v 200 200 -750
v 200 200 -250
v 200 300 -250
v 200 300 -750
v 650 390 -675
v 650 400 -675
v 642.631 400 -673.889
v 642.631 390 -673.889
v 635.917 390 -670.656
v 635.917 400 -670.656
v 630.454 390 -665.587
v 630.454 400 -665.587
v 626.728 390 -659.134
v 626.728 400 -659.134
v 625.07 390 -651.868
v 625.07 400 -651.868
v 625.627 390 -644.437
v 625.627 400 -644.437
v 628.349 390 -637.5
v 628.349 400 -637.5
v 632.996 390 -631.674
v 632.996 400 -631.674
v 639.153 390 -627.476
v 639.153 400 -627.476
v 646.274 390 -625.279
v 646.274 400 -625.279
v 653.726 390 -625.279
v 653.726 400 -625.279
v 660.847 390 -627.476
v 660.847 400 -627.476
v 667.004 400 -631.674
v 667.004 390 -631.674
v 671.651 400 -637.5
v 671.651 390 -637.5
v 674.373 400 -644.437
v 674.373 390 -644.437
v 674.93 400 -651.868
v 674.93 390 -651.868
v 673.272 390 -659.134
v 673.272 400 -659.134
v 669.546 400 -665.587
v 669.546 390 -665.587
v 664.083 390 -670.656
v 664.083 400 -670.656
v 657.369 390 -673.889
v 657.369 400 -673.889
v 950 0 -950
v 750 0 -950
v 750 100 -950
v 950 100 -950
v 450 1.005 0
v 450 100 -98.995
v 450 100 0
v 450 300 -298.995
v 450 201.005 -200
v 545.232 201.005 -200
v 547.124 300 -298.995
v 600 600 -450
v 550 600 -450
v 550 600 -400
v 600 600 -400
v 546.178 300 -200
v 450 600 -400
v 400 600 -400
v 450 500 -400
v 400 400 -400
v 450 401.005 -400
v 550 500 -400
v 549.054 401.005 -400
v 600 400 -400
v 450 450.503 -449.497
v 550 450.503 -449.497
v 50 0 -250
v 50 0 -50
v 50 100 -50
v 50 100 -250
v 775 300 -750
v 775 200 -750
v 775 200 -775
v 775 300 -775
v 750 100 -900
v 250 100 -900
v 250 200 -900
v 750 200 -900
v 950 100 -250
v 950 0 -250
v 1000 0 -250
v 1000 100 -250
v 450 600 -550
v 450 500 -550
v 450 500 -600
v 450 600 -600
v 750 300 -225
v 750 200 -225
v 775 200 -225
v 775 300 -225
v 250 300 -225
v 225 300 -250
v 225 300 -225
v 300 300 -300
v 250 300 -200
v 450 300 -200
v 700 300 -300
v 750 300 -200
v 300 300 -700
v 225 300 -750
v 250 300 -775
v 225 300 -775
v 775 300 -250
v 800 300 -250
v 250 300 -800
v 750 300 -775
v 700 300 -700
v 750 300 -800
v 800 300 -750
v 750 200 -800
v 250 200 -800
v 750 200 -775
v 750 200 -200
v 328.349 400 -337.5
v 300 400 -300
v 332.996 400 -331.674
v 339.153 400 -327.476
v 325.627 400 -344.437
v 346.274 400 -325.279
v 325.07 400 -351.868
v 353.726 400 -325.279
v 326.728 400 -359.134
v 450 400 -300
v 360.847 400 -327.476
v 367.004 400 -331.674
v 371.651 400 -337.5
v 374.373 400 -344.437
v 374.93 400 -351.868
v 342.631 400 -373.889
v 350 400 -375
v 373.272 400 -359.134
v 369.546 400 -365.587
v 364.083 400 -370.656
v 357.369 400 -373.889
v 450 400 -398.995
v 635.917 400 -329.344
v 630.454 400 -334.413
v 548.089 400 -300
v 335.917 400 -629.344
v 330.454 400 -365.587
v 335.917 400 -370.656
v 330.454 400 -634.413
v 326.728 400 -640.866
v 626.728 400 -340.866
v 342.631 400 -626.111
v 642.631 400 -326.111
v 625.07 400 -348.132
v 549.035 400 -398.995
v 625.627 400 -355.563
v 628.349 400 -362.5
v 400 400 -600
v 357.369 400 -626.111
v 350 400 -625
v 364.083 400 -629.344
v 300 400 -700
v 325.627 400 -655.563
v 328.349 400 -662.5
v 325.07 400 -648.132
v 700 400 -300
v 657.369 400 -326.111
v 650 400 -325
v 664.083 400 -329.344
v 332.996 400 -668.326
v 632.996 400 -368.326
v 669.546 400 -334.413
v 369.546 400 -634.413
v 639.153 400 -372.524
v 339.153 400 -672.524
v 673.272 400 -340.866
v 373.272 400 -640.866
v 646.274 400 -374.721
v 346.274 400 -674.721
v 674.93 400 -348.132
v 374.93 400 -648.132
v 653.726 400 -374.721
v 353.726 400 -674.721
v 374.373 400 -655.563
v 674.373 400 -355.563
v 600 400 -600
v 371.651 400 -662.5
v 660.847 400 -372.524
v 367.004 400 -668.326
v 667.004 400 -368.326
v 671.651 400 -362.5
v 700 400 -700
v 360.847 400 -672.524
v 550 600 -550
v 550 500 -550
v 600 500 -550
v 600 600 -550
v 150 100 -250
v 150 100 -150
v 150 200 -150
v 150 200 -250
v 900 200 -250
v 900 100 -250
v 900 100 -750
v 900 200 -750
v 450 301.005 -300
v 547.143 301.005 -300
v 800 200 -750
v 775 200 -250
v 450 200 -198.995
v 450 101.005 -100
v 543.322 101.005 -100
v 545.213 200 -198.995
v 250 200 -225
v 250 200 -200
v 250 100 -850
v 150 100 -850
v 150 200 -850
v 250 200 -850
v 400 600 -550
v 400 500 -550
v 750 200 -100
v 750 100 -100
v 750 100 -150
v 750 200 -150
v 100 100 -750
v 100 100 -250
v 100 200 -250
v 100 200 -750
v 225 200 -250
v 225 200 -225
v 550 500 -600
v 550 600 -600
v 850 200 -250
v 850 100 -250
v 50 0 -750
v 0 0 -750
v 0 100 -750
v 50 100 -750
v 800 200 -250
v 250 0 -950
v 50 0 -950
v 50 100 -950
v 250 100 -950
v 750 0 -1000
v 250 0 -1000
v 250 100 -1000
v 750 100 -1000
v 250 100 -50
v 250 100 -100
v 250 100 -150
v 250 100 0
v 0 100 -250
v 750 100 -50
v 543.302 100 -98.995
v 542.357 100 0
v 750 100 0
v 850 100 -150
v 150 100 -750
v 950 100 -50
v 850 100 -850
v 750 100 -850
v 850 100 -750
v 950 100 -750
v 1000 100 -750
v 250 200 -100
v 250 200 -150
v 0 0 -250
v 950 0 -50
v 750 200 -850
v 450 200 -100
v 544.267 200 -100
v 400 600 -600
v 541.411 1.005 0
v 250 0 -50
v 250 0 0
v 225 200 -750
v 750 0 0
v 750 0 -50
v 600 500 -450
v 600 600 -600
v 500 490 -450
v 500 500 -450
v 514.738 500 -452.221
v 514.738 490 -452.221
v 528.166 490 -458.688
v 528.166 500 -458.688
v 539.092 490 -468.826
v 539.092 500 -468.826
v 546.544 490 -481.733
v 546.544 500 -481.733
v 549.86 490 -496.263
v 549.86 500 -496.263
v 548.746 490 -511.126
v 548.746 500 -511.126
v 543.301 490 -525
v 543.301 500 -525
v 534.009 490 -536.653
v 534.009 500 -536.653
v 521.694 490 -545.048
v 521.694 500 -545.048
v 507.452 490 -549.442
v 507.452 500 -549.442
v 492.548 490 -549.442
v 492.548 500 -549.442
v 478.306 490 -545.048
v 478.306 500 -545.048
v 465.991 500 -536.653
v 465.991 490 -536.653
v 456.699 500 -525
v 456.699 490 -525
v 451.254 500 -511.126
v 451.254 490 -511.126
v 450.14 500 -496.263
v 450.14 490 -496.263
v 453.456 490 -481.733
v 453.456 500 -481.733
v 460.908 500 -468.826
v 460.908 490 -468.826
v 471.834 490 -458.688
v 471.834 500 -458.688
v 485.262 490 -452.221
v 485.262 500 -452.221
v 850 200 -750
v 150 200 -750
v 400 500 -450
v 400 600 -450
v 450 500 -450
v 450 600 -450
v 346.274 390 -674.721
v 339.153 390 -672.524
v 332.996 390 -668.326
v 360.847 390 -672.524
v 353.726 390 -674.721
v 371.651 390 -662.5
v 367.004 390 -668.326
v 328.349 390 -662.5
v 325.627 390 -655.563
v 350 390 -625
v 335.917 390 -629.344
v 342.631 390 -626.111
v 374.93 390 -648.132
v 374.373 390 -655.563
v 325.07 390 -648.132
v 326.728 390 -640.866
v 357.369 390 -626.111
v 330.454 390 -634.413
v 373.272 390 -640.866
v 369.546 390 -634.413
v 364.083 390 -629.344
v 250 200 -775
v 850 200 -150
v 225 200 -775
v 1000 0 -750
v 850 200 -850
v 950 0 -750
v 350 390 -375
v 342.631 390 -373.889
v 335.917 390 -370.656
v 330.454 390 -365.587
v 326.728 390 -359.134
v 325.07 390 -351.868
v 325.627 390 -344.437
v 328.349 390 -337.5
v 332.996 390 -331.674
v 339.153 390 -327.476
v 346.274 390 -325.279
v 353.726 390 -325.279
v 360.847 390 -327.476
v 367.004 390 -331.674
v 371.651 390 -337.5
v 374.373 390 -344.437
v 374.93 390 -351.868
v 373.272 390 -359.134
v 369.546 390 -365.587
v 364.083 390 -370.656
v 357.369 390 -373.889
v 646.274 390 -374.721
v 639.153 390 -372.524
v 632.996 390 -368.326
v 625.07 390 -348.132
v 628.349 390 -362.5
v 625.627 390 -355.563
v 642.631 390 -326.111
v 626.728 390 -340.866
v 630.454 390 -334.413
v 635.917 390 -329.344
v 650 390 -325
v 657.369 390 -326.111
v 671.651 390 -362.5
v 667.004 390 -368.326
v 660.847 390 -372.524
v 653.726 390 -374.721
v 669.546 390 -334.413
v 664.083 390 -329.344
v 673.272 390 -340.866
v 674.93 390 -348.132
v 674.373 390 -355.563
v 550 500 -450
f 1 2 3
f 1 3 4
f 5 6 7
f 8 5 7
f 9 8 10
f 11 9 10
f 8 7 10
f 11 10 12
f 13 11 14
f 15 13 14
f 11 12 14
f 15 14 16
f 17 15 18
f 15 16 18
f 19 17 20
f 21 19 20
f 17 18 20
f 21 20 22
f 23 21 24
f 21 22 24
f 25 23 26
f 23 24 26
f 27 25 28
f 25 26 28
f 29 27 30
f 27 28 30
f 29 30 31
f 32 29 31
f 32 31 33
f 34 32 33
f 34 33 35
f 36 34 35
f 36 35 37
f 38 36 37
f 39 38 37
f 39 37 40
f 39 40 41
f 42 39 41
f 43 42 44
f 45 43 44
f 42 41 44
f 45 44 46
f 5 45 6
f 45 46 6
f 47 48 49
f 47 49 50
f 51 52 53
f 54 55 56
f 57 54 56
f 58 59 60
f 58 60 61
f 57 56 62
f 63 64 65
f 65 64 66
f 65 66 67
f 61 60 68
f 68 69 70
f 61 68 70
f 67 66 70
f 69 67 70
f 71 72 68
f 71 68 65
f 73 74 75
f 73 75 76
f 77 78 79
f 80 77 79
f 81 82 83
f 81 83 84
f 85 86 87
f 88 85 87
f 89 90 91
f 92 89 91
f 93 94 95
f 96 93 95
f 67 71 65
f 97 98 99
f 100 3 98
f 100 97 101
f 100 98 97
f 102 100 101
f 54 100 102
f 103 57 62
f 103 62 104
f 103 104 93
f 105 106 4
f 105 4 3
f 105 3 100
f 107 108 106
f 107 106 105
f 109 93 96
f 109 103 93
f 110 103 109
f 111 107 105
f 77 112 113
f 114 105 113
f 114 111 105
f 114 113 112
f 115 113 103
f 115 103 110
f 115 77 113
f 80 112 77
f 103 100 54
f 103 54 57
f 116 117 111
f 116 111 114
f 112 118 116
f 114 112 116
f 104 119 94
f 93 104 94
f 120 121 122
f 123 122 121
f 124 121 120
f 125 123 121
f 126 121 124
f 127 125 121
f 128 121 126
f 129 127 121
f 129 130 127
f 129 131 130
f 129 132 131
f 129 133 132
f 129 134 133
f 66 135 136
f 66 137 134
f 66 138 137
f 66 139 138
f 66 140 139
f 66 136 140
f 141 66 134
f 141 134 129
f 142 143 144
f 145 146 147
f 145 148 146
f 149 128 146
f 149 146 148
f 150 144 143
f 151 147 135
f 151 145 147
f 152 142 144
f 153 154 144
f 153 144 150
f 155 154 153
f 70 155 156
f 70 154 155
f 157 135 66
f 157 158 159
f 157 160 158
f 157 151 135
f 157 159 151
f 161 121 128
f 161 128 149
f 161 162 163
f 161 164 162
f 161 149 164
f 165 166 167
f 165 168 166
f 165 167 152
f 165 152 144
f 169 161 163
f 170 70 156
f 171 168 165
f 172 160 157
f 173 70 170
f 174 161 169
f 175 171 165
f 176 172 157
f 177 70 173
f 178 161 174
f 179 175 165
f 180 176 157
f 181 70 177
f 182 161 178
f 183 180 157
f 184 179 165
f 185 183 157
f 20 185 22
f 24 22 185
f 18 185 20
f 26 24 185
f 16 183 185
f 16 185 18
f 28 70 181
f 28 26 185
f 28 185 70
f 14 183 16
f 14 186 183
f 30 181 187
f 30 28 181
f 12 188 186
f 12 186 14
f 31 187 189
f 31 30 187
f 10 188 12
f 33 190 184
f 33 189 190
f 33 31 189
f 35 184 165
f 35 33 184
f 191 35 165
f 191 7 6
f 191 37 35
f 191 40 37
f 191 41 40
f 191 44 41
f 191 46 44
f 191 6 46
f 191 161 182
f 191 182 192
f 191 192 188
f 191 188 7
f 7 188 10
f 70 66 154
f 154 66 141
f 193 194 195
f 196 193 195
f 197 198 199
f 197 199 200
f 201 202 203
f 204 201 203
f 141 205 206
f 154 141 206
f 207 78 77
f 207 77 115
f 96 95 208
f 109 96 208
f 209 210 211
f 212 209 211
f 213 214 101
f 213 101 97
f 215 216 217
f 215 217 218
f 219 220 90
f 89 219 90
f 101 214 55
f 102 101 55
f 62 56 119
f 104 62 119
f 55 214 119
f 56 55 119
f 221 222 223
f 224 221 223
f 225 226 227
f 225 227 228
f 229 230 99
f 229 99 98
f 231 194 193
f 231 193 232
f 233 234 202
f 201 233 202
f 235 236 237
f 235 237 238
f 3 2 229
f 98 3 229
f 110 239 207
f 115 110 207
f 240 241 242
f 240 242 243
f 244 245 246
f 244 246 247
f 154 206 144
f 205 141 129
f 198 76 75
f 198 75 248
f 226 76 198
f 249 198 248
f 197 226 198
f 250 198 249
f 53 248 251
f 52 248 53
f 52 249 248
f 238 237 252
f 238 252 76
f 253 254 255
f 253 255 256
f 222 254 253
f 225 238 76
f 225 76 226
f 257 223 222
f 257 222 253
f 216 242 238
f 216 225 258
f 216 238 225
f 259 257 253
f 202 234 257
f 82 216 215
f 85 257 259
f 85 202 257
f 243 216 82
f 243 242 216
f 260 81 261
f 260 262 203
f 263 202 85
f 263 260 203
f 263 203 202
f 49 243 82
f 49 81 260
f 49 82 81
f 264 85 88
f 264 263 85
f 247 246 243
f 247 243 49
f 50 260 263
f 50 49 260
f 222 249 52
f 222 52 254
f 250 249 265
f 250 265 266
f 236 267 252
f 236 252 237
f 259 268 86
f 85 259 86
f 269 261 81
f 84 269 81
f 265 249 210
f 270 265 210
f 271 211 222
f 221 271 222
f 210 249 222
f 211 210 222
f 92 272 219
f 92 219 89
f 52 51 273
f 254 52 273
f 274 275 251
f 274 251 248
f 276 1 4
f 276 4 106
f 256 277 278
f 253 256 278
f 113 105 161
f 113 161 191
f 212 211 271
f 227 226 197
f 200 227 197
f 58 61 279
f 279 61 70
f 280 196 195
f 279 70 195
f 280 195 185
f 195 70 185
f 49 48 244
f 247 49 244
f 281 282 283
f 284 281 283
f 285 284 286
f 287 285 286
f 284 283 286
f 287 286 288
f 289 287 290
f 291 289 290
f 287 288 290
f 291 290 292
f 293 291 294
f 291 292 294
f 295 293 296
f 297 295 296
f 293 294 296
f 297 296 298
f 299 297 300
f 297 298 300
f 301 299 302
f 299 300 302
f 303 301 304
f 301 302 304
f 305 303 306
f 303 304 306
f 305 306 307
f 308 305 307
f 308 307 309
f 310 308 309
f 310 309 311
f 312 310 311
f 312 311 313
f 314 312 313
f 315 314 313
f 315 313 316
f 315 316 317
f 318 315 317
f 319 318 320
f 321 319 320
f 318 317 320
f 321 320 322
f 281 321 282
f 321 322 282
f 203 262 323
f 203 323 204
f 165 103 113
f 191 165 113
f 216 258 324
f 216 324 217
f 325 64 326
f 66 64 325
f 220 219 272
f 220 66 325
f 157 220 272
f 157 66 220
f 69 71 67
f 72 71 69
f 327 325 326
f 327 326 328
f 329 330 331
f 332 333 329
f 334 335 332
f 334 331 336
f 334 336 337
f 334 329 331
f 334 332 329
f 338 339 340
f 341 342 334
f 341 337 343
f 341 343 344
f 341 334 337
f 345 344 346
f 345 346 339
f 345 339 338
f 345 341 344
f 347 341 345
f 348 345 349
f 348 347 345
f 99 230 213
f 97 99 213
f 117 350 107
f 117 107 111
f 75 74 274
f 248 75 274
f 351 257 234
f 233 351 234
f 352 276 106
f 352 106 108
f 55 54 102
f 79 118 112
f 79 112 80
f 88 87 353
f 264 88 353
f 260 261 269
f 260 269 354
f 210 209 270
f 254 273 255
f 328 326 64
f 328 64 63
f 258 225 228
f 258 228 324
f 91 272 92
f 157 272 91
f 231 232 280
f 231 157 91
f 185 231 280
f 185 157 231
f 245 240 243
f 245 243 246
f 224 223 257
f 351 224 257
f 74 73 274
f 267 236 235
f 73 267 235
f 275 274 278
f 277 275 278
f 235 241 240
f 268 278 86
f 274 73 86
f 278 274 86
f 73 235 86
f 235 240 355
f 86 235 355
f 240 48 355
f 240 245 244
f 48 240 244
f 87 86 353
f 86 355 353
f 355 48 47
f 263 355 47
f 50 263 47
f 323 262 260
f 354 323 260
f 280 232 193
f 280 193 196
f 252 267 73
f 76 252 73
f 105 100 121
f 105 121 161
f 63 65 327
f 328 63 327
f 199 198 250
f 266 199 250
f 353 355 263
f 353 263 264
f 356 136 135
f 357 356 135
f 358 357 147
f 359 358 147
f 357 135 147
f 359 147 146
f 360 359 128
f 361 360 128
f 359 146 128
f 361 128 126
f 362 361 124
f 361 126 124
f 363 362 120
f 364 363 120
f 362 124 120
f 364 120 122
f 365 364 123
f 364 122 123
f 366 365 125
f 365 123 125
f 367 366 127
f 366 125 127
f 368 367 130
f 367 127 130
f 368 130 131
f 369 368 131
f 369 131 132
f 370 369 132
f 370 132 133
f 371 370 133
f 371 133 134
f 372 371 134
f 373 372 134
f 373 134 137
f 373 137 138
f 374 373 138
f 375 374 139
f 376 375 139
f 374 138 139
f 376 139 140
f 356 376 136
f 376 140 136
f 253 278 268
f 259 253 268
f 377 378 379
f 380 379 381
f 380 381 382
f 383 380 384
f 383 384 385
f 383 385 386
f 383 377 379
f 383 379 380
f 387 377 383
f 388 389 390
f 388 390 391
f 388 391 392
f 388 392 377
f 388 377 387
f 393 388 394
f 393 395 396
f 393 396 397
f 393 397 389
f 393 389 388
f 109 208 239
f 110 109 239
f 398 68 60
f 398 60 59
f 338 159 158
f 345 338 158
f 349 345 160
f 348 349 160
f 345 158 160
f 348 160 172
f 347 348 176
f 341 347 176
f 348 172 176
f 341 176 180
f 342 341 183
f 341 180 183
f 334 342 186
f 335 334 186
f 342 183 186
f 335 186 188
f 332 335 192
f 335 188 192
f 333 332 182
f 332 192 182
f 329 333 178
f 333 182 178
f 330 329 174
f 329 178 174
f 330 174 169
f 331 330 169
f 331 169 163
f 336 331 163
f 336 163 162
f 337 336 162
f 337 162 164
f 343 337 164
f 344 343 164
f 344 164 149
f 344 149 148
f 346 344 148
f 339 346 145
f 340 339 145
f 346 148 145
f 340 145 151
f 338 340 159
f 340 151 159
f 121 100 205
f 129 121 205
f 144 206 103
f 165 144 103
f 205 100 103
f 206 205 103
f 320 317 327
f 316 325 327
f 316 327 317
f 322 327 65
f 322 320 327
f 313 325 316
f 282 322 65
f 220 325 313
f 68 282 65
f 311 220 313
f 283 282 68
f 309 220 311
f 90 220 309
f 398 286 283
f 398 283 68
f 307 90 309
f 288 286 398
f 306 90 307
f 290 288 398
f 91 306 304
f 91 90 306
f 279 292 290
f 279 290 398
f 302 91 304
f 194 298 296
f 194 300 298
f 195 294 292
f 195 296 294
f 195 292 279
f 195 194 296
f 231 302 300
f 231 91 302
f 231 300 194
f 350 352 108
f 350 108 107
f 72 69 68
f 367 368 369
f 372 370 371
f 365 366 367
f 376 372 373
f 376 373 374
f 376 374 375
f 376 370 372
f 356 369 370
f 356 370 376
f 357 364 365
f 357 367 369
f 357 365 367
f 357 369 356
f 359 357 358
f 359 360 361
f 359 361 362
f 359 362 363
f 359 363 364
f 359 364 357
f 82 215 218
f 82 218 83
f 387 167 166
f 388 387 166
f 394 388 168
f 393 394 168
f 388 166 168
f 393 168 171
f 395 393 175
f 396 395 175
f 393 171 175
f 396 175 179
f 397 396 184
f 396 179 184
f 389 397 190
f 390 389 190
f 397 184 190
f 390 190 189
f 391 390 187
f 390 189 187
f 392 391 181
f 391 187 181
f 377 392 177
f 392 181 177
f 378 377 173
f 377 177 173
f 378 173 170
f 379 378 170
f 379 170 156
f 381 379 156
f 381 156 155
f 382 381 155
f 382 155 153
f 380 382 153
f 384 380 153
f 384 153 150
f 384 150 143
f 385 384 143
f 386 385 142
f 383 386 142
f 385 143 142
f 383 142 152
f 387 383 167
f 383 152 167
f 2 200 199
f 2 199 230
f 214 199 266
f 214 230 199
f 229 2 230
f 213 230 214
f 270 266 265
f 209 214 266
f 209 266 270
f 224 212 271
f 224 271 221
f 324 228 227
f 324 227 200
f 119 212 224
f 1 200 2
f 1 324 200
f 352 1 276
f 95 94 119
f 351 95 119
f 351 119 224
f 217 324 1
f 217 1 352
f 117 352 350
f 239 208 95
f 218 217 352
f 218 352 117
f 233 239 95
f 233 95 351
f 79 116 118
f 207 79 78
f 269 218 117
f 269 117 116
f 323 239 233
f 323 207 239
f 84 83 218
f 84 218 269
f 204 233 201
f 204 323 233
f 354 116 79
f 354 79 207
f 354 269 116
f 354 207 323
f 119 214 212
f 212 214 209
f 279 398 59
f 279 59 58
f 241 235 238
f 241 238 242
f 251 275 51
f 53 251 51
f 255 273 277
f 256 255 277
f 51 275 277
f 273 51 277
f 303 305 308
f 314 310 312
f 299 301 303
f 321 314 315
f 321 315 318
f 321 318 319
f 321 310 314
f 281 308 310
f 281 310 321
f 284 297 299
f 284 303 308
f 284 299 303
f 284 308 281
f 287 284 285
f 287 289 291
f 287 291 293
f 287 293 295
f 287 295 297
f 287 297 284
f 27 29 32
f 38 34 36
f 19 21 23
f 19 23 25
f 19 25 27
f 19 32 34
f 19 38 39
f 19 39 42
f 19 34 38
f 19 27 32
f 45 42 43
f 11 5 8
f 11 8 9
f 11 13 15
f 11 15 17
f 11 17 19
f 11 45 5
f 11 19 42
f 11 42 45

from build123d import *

# Parameters (mm, degrees)
SKETCH2_W               = 1000
SKETCH2_H               = 1000
BOSS_EXTRUDE1_DEPTH     = 100
SKETCH3_W               = 800
SKETCH3_H               = 800
BOSS_EXTRUDE2_DEPTH     = 100
SKETCH4_W               = 600
SKETCH4_H               = 600
BOSS_EXTRUDE3_DEPTH     = 100
SKETCH5_W               = 400
SKETCH5_H               = 400
BOSS_EXTRUDE4_DEPTH     = 100
SKETCH6_W               = 200
SKETCH6_H               = 200
BOSS_EXTRUDE5_DEPTH     = 100
CUT_EXTRUDE2_DEPTH      = 1470.69384567
CUT_EXTRUDE2_DEPTH_BACK = 1470.69384567
SKETCH8_W               = 250
SKETCH8_H               = 250
CUT_EXTRUDE3_DEPTH      = 1519.222645069
CUT_EXTRUDE3_DEPTH_BACK = 70
SKETCH17_W              = 200
SKETCH17_H              = 200
BOSS_EXTRUDE6_DEPTH     = 100
SKETCH18_W              = 100
SKETCH18_H              = 100
BOSS_EXTRUDE7_DEPTH     = 100
SKETCH19_W              = 25
SKETCH19_H              = 25
BOSS_EXTRUDE8_DEPTH     = 100
SKETCH20_W              = 50
SKETCH20_H              = 50
BOSS_EXTRUDE9_DEPTH     = 100
SKETCH21_R              = 50
CUT_EXTRUDE4_DEPTH      = 10
SKETCH22_R              = 25
CUT_EXTRUDE5_DEPTH      = 10


with BuildPart() as part:
    # Sketch2 → Boss-Extrude1 (new body)
    with BuildSketch(Plane(origin=(0, 0, 0), x_dir=(1, 0, 0), z_dir=(0, 1, 0))):
        with Locations((500, 500)):
            Rectangle(SKETCH2_W, SKETCH2_H)
    extrude(amount=BOSS_EXTRUDE1_DEPTH)

    # Sketch3 → Boss-Extrude2 (add)
    with BuildSketch(Plane(origin=(0, 100, 0), x_dir=(1, 0, 0), z_dir=(0, 1, 0))):
        with Locations((500, 500)):
            Rectangle(SKETCH3_W, SKETCH3_H)
    extrude(amount=BOSS_EXTRUDE2_DEPTH)

    # Sketch4 → Boss-Extrude3 (add)
    with BuildSketch(Plane(origin=(0, 200, 0), x_dir=(1, 0, 0), z_dir=(0, 1, 0))):
        with Locations((500, 500)):
            Rectangle(SKETCH4_W, SKETCH4_H)
    extrude(amount=BOSS_EXTRUDE3_DEPTH)

    # Sketch5 → Boss-Extrude4 (add)
    with BuildSketch(Plane(origin=(0, 300, 0), x_dir=(1, 0, 0), z_dir=(0, 1, 0))):
        with Locations((500, 500)):
            Rectangle(SKETCH5_W, SKETCH5_H)
    extrude(amount=BOSS_EXTRUDE4_DEPTH)

    # Sketch6 → Boss-Extrude5 (add)
    with BuildSketch(Plane(origin=(0, 400, 0), x_dir=(1, 0, 0), z_dir=(0, 1, 0))):
        with Locations((500, 500)):
            Rectangle(SKETCH6_W, SKETCH6_H)
    extrude(amount=BOSS_EXTRUDE5_DEPTH)

    # Sketch8 → Cut-Extrude2 (cut, two sides: drawn at the far end of the back side and taken through both)
    with BuildSketch(Plane(origin=(0, 100, 0), x_dir=(1, 0, 0), z_dir=(0, 1, 0)).offset(-CUT_EXTRUDE2_DEPTH_BACK)):
        with Locations((125, 125)):
            Rectangle(SKETCH8_W, SKETCH8_H)
        with Locations((875, 125)):
            Rectangle(SKETCH8_W, SKETCH8_H)
        with Locations((875, 875)):
            Rectangle(SKETCH8_W, SKETCH8_H)
        with Locations((125, 875)):
            Rectangle(SKETCH8_W, SKETCH8_H)
    extrude(amount=CUT_EXTRUDE2_DEPTH + CUT_EXTRUDE2_DEPTH_BACK, mode=Mode.SUBTRACT)

    # Sketch16 → Cut-Extrude3 (cut, two sides: drawn at the far end of the back side and taken through both)
    with BuildSketch(Plane(origin=(0, 50, 50), x_dir=(1, 0, 0), z_dir=(0, 0.7071067811865477, 0.7071067811865475)).offset(-CUT_EXTRUDE3_DEPTH_BACK)):
        Polygon((450, 636.396103068), (450, -32.366607249), (540.963803132, -32.366607249), (550, 636.396103068), align=None)
    extrude(amount=CUT_EXTRUDE3_DEPTH + CUT_EXTRUDE3_DEPTH_BACK, mode=Mode.SUBTRACT)

    # Sketch17 → Boss-Extrude6 (add)
    with BuildSketch(Plane(origin=(0, 0, 0), x_dir=(1, 0, 0), z_dir=(0, 1, 0))):
        with Locations((150, 850)):
            Rectangle(SKETCH17_W, SKETCH17_H)
        with Locations((850, 850)):
            Rectangle(SKETCH17_W, SKETCH17_H)
        with Locations((850, 150)):
            Rectangle(SKETCH17_W, SKETCH17_H)
        with Locations((150, 150)):
            Rectangle(SKETCH17_W, SKETCH17_H)
    extrude(amount=BOSS_EXTRUDE6_DEPTH)

    # Sketch18 → Boss-Extrude7 (add)
    with BuildSketch(Plane(origin=(0, 100, 0), x_dir=(1, 0, 0), z_dir=(0, 1, 0))):
        with Locations((200, 200)):
            Rectangle(SKETCH18_W, SKETCH18_H)
        with Locations((800, 200)):
            Rectangle(SKETCH18_W, SKETCH18_H)
        with Locations((800, 800)):
            Rectangle(SKETCH18_W, SKETCH18_H)
        with Locations((200, 800)):
            Rectangle(SKETCH18_W, SKETCH18_H)
    extrude(amount=BOSS_EXTRUDE7_DEPTH)

    # Sketch19 → Boss-Extrude8 (add)
    with BuildSketch(Plane(origin=(0, 200, 0), x_dir=(1, 0, 0), z_dir=(0, 1, 0))):
        with Locations((762.5, 237.5)):
            Rectangle(SKETCH19_W, SKETCH19_H)
        with Locations((762.5, 762.5)):
            Rectangle(SKETCH19_W, SKETCH19_H)
        with Locations((237.5, 762.5)):
            Rectangle(SKETCH19_W, SKETCH19_H)
        with Locations((237.5, 237.5)):
            Rectangle(SKETCH19_W, SKETCH19_H)
    extrude(amount=BOSS_EXTRUDE8_DEPTH)

    # Sketch20 → Boss-Extrude9 (add)
    with BuildSketch(Plane(origin=(0, 500, 0), x_dir=(1, 0, 0), z_dir=(0, 1, 0))):
        with Locations((425, 575)):
            Rectangle(SKETCH20_W, SKETCH20_H)
        with Locations((425, 425)):
            Rectangle(SKETCH20_W, SKETCH20_H)
        with Locations((575, 425)):
            Rectangle(SKETCH20_W, SKETCH20_H)
        with Locations((575, 575)):
            Rectangle(SKETCH20_W, SKETCH20_H)
    extrude(amount=BOSS_EXTRUDE9_DEPTH)

    # Sketch21 → Cut-Extrude4 (cut)
    with BuildSketch(Plane(origin=(0, 500, 0), x_dir=(1, 0, 0), z_dir=(0, 1, 0))):
        with Locations(Location((500, 500, 0), (0, 0, 270))):
            Circle(SKETCH21_R)
    extrude(amount=-CUT_EXTRUDE4_DEPTH, mode=Mode.SUBTRACT)

    # Sketch22 → Cut-Extrude5 (cut)
    with BuildSketch(Plane(origin=(0, 400, 0), x_dir=(1, 0, 0), z_dir=(0, 1, 0))):
        with Locations(Location((350, 650, 0), (0, 0, 270))):
            Circle(SKETCH22_R)
        with Locations(Location((650, 650, 0), (0, 0, 90))):
            Circle(SKETCH22_R)
        with Locations(Location((650, 350, 0), (0, 0, 270))):
            Circle(SKETCH22_R)
        with Locations(Location((350, 350, 0), (0, 0, 90))):
            Circle(SKETCH22_R)
    extrude(amount=-CUT_EXTRUDE5_DEPTH, mode=Mode.SUBTRACT)


solid = part.part
